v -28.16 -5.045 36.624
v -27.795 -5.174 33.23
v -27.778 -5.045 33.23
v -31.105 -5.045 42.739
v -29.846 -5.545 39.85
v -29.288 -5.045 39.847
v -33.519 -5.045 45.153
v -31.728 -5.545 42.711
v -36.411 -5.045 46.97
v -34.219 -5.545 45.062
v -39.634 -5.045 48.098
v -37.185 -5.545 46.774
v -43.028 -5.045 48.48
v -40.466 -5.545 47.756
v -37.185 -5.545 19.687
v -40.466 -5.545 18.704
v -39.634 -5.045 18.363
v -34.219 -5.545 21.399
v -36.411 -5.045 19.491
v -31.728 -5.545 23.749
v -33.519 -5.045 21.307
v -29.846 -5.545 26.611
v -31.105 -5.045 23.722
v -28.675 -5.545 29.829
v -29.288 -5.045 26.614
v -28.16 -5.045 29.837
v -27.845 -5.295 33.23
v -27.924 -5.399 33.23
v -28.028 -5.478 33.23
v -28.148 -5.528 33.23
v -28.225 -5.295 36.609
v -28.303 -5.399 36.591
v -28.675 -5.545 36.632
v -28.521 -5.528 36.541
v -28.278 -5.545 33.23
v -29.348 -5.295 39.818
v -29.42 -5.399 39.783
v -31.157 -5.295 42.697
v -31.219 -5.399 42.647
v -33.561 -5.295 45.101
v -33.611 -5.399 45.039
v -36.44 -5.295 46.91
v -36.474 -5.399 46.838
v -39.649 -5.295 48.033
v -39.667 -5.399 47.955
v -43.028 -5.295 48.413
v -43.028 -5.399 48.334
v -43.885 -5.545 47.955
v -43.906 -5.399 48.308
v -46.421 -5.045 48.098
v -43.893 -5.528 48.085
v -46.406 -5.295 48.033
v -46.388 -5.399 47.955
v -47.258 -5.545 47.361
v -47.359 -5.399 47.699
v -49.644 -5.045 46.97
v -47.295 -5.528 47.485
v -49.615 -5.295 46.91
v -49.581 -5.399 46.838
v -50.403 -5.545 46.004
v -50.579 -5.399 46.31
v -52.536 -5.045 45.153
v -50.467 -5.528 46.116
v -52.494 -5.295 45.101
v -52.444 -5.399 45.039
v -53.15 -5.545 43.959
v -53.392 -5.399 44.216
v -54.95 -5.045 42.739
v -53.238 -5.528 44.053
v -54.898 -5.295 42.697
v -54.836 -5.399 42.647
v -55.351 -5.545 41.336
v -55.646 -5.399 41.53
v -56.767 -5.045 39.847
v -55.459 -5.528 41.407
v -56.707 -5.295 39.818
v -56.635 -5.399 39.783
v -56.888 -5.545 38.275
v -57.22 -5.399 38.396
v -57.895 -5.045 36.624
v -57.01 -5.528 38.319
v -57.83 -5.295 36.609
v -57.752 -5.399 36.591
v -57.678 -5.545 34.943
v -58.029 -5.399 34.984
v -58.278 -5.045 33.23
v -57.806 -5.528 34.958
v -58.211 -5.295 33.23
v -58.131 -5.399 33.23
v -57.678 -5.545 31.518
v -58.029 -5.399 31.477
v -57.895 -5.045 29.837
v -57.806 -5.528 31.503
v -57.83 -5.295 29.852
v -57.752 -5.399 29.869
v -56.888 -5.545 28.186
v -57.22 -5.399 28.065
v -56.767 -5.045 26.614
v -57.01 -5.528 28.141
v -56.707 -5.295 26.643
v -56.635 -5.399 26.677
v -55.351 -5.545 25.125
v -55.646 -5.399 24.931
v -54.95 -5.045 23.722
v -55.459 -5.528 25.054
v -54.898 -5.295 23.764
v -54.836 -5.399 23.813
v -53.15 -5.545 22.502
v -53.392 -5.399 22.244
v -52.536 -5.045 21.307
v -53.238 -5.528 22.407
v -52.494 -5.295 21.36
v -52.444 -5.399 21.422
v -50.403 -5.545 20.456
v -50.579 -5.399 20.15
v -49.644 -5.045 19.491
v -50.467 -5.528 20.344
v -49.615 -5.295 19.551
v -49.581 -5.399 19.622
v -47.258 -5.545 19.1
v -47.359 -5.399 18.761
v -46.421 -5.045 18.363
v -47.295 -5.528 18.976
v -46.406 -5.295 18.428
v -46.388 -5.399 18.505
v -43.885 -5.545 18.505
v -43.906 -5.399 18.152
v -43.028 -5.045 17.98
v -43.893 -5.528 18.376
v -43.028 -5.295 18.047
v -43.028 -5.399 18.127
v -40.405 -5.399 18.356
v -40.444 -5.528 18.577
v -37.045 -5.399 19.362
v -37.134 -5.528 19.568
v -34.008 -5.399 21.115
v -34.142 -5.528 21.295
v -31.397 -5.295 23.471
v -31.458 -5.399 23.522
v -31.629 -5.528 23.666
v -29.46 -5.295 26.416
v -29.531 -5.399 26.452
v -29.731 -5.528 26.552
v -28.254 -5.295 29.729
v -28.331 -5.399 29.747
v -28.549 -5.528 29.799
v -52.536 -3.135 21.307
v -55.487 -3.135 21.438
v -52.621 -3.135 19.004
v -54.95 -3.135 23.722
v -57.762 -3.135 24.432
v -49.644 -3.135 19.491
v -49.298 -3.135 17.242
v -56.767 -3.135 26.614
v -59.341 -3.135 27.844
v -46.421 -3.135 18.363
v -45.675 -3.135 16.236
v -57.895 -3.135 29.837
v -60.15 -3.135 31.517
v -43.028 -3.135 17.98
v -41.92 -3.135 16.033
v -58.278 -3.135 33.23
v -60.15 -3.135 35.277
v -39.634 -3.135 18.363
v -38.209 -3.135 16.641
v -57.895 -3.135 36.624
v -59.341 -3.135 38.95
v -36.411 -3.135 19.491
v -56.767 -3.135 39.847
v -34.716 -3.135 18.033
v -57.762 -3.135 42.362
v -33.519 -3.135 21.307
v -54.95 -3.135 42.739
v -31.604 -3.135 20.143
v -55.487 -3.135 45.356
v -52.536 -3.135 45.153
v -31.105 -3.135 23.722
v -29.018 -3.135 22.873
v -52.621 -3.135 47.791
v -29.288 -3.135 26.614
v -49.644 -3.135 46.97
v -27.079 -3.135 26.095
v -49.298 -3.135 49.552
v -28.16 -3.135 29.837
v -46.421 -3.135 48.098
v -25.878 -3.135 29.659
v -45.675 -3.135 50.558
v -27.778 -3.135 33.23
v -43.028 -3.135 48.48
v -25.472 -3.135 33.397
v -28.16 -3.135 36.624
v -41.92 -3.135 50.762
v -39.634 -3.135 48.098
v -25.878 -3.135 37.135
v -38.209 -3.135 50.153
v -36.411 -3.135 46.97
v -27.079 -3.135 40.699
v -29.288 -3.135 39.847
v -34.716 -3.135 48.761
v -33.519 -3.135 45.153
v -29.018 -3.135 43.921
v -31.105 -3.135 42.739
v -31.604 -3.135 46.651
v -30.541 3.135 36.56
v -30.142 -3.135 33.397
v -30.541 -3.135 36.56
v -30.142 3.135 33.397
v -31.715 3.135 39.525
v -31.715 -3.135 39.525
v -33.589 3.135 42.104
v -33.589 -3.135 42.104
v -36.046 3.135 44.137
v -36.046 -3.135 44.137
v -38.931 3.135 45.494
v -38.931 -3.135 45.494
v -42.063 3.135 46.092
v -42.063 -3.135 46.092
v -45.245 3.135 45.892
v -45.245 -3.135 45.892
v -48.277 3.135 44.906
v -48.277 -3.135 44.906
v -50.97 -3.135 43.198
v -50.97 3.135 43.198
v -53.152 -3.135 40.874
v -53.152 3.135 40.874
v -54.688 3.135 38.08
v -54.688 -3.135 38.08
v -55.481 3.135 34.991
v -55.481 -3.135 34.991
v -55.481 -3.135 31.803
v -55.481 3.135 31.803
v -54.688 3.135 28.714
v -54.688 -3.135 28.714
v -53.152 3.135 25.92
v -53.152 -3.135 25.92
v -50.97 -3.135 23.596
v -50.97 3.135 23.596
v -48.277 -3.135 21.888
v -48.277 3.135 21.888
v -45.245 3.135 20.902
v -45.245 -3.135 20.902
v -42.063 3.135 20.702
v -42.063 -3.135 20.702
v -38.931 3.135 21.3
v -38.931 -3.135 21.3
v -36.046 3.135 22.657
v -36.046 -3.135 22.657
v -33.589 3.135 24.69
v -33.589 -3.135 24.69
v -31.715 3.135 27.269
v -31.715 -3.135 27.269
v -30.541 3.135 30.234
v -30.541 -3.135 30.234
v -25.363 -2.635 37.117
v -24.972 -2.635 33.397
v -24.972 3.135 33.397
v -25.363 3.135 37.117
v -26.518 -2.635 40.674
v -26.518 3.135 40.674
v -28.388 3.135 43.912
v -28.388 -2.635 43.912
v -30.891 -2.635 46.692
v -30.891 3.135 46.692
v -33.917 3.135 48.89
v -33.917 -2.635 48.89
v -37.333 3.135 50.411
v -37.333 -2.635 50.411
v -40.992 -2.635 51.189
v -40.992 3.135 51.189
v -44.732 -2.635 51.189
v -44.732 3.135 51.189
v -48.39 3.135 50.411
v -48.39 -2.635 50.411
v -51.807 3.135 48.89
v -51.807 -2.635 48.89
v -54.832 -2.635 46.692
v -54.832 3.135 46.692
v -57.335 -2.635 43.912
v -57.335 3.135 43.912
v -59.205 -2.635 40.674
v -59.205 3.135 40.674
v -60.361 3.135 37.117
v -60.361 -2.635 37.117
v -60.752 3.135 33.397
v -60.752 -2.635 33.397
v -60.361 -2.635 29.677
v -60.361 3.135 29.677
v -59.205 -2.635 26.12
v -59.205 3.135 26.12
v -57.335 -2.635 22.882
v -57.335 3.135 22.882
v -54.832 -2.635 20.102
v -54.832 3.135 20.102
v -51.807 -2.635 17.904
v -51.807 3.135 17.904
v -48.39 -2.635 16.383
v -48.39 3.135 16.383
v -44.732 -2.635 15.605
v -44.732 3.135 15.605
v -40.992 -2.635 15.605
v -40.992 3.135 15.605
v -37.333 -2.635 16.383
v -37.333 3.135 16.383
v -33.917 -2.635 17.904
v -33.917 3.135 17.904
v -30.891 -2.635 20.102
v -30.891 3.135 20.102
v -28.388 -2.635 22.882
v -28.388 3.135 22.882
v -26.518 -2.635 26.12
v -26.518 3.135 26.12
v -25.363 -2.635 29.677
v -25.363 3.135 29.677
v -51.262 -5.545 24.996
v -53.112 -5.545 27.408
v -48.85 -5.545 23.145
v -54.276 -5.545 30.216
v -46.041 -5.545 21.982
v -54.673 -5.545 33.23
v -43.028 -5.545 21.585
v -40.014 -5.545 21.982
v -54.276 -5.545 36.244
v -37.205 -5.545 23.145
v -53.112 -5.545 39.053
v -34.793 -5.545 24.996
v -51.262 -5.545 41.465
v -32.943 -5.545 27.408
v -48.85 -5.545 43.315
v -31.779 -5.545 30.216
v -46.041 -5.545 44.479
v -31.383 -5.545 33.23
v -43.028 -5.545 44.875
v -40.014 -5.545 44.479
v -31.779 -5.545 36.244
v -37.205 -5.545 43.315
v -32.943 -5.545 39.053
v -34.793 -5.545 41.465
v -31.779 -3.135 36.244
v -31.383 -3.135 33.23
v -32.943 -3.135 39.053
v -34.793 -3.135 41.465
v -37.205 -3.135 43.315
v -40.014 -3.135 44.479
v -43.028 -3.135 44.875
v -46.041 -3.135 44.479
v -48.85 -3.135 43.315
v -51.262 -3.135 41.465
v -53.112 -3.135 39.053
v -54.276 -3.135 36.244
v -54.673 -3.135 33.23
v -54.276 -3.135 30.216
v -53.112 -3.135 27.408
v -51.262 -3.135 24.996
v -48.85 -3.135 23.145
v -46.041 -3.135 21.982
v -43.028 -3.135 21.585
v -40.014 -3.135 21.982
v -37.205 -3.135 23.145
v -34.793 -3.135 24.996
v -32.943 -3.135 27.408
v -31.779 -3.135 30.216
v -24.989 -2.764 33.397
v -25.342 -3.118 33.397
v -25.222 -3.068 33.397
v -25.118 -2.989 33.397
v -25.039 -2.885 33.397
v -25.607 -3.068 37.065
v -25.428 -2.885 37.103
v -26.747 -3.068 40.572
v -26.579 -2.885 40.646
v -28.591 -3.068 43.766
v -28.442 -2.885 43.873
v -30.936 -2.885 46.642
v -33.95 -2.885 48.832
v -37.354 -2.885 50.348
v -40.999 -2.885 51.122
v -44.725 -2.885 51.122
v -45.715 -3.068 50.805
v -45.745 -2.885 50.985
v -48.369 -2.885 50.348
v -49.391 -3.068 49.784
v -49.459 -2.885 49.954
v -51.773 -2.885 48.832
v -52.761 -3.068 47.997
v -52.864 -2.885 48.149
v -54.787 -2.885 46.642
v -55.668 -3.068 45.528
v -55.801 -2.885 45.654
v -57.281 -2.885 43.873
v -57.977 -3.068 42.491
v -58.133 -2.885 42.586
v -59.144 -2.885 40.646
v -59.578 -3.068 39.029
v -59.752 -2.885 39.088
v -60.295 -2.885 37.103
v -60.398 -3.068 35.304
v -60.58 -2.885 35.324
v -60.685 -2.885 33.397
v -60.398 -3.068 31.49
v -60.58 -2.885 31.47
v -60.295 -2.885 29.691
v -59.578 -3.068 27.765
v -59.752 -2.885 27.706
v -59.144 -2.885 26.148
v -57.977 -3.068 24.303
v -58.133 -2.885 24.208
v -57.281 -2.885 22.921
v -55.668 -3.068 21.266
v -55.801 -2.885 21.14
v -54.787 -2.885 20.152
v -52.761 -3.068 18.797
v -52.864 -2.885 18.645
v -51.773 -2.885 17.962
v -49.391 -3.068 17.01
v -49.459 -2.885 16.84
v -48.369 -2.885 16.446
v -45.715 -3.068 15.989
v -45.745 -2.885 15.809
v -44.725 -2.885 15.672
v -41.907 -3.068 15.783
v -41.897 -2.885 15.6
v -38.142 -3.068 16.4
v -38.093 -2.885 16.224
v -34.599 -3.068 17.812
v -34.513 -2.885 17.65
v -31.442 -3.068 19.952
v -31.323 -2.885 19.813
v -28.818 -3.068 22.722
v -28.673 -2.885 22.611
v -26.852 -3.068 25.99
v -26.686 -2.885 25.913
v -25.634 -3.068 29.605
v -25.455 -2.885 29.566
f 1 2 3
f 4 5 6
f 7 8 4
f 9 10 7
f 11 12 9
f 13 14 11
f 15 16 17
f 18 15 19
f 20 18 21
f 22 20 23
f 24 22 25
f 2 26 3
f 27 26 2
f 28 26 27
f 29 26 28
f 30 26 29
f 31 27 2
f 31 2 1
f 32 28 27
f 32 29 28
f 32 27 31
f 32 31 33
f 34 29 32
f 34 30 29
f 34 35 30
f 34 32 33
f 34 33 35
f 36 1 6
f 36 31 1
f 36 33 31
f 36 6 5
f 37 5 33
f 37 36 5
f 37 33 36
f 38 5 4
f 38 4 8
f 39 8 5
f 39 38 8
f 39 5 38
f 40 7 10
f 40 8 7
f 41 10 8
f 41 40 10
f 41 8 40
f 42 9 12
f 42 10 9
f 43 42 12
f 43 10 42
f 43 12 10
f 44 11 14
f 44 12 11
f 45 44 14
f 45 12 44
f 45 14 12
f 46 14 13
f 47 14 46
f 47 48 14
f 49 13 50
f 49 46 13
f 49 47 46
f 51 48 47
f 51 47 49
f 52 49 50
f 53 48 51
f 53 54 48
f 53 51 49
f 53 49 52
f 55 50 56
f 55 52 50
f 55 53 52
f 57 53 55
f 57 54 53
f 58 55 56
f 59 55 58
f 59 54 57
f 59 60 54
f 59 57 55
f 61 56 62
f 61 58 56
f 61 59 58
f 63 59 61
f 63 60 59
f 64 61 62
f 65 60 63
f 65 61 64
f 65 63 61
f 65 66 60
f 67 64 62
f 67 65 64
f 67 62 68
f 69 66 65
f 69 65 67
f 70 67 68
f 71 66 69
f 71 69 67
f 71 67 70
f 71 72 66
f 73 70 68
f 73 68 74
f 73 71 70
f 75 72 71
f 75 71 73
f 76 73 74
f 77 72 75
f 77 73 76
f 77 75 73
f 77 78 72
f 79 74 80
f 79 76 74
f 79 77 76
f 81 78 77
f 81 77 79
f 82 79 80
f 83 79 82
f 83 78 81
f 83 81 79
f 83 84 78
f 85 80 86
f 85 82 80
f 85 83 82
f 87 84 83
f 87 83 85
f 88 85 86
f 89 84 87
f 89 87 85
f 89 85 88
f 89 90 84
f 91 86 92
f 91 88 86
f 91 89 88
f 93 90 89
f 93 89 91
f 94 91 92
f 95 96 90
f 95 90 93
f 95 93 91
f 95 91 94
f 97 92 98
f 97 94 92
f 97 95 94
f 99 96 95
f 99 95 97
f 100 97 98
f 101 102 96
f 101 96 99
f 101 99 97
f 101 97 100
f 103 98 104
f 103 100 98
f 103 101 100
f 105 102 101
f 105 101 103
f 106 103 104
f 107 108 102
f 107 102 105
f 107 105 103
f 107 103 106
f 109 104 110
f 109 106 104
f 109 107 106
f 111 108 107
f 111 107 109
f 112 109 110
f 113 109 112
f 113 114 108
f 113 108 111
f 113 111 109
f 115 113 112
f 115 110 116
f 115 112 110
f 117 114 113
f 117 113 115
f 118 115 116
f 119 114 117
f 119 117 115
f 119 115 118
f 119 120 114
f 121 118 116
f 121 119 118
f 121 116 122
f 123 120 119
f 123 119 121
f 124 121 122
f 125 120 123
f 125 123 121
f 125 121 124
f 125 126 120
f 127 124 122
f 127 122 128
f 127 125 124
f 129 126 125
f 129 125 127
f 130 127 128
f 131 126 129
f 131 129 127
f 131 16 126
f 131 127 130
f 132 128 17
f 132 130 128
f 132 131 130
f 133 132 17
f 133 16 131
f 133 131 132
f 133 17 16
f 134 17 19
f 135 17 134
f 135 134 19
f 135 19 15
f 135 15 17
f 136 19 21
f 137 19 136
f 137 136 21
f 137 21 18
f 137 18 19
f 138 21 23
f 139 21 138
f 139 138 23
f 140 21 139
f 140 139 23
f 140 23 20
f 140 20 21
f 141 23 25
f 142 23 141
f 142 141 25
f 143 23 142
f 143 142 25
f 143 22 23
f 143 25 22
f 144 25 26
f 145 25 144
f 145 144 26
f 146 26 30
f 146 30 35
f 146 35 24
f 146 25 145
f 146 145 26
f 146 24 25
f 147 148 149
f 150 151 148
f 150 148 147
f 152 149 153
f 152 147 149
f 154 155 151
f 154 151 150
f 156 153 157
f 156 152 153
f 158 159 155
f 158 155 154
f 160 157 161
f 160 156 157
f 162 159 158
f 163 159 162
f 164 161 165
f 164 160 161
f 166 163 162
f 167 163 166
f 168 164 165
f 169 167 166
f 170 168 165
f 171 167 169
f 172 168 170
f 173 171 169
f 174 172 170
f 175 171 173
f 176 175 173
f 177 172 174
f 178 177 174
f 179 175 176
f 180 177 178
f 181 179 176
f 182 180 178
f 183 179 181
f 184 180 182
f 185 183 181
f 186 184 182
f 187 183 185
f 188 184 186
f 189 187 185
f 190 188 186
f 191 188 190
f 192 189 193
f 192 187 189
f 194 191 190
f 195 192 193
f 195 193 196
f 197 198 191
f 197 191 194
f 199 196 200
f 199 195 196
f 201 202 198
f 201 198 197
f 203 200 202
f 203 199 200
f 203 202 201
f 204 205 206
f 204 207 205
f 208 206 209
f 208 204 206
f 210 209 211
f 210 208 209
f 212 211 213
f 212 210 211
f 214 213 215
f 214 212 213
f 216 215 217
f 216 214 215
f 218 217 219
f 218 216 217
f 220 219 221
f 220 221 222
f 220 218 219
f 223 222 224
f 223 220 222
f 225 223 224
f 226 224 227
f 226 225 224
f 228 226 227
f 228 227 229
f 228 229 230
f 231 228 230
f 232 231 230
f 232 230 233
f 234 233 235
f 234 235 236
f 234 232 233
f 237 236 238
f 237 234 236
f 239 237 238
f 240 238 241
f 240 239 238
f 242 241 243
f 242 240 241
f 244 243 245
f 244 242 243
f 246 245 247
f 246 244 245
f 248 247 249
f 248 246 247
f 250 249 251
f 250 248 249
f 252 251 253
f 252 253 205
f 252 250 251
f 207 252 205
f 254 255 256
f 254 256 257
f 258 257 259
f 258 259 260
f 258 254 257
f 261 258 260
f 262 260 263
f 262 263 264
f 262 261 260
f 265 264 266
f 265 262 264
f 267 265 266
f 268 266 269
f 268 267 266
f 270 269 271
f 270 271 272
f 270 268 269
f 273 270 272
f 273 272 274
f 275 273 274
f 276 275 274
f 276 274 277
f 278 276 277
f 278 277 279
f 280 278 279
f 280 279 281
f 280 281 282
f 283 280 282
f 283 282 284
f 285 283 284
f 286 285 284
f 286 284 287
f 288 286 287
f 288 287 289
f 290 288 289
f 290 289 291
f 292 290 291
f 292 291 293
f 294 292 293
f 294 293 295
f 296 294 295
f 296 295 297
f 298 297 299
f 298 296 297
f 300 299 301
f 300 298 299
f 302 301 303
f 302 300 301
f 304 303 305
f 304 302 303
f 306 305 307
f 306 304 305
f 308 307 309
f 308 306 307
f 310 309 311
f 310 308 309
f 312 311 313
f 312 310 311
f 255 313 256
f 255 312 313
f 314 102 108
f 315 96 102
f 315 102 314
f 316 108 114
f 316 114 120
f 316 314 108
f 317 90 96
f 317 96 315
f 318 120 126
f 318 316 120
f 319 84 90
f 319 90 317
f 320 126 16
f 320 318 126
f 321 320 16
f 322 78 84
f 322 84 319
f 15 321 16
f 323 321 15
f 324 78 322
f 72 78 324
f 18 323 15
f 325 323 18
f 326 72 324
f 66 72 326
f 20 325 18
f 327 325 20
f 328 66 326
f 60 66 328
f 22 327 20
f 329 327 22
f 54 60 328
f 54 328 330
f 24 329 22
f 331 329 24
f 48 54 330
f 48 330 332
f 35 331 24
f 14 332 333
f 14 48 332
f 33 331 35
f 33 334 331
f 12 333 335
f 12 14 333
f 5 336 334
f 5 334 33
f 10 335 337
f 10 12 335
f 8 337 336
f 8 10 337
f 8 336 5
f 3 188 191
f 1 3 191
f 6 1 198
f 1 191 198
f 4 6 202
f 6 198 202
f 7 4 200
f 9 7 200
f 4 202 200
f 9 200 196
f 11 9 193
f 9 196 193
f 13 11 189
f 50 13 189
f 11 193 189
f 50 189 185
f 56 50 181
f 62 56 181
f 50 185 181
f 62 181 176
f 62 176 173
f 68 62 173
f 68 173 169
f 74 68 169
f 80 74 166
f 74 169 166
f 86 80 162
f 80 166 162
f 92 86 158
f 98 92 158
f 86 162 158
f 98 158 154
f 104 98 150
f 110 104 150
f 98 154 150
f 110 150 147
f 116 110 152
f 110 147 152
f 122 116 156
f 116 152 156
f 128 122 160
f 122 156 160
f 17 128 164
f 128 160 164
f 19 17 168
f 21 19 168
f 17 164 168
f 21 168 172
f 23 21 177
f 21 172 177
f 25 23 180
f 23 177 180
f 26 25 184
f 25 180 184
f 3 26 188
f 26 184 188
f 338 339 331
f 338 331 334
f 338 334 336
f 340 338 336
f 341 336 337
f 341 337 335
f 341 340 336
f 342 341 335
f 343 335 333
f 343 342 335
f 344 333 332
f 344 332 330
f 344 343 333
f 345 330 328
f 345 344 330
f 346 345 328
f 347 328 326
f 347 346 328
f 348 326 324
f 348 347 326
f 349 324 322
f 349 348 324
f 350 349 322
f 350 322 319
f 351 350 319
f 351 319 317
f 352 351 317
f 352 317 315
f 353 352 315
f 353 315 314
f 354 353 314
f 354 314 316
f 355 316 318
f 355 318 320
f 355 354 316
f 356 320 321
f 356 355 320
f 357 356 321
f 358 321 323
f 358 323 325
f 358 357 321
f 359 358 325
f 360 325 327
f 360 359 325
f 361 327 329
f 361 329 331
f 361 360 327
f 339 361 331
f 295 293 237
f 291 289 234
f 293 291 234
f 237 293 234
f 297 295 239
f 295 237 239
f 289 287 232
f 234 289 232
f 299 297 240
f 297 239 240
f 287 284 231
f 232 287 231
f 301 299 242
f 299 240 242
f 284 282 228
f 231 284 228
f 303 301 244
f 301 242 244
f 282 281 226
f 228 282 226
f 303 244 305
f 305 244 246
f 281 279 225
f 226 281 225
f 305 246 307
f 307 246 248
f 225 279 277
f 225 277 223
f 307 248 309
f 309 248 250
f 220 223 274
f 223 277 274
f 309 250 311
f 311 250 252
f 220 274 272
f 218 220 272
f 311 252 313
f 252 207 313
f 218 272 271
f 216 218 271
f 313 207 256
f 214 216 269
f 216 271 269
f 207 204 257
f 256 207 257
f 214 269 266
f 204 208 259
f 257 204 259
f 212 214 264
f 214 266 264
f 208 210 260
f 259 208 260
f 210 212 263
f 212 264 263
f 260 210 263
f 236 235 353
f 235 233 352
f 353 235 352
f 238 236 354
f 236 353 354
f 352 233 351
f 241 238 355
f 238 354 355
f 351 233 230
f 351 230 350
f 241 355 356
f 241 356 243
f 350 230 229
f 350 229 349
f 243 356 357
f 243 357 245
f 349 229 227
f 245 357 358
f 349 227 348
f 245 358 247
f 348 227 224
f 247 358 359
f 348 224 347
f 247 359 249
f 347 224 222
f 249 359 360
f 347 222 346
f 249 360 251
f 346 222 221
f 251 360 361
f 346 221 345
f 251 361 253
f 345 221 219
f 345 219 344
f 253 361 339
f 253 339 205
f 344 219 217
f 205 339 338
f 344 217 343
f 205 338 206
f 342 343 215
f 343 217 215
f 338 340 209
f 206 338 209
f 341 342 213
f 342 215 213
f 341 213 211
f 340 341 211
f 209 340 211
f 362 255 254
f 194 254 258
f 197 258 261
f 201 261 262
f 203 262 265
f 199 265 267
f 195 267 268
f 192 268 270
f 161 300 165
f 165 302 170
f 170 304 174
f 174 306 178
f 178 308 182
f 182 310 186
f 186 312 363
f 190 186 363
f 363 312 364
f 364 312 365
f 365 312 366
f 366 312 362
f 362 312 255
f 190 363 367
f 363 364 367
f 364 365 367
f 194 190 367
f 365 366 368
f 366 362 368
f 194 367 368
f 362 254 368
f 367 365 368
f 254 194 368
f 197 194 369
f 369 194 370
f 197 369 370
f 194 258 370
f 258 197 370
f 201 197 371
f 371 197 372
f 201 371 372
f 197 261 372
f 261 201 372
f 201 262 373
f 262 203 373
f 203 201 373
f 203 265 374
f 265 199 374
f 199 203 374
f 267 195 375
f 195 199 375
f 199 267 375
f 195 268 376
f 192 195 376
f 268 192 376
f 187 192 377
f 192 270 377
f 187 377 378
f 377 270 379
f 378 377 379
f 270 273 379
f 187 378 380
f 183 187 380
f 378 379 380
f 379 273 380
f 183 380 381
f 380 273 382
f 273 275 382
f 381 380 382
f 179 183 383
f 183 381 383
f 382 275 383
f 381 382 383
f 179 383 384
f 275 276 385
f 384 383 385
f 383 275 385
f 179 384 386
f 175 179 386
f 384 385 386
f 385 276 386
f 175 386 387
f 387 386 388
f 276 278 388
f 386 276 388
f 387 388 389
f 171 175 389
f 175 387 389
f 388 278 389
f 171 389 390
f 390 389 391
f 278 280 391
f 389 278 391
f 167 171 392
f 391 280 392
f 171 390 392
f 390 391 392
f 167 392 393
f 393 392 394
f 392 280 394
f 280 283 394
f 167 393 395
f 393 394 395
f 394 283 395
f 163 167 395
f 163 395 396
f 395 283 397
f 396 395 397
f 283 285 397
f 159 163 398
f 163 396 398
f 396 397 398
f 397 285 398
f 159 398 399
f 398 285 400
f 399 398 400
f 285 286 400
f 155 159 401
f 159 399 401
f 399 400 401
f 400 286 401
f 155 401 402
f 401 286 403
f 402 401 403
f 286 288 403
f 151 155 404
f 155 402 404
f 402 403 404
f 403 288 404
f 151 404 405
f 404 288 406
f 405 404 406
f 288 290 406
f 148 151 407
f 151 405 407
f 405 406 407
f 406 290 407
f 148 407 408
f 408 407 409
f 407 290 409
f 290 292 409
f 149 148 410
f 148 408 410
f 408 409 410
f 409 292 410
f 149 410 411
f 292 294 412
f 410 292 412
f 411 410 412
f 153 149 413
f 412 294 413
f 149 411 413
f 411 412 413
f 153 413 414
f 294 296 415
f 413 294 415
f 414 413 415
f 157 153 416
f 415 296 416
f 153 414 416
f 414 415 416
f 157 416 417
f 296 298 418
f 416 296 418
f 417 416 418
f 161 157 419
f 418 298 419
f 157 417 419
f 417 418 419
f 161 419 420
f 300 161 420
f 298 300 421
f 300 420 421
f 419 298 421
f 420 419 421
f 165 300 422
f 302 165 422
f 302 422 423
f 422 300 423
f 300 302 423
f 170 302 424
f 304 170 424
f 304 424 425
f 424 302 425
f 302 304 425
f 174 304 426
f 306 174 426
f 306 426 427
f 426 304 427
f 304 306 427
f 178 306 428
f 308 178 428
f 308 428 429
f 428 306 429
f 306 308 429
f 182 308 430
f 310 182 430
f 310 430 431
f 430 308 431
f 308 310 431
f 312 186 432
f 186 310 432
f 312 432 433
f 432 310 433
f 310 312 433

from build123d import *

# Parameters (mm, degrees)
F0_R     = 17.89
F0_R_2   = 12.72
F1_DEPTH = 3.135
F3_R     = 15.25
F3_R_2   = 11.645
F4_DEPTH = 2.41
F5_R     = 0.5


with BuildPart() as f1:
    # F0 (on Front) → F1 (new body, symmetric)
    with BuildSketch(Plane.XZ):
        with Locations((-42.8615688275, 33.3970142528)):
            Circle(F0_R)
        with Locations((-42.8615688275, 33.3970142528)):
            Circle(F0_R_2, mode=Mode.SUBTRACT)
    extrude(amount=F1_DEPTH, both=True)

    # F3 (on offset) → F4 (join)
    with BuildSketch(Plane.XZ.offset(3.135)):
        with Locations((-43.0275388062, 33.2303009927)):
            Circle(F3_R)
        with Locations((-43.0275388062, 33.2303009927)):
            Circle(F3_R_2, mode=Mode.SUBTRACT)
    extrude(amount=F4_DEPTH)

    # F5
    f5_edges = [f1.edges().sort_by_distance(p)[0] for p in [
        (-58.277539, -5.545, 33.230301),
        (-60.751569, -3.135, 33.397014),
    ]]
    fillet(f5_edges, radius=F5_R)


solid = f1.part
